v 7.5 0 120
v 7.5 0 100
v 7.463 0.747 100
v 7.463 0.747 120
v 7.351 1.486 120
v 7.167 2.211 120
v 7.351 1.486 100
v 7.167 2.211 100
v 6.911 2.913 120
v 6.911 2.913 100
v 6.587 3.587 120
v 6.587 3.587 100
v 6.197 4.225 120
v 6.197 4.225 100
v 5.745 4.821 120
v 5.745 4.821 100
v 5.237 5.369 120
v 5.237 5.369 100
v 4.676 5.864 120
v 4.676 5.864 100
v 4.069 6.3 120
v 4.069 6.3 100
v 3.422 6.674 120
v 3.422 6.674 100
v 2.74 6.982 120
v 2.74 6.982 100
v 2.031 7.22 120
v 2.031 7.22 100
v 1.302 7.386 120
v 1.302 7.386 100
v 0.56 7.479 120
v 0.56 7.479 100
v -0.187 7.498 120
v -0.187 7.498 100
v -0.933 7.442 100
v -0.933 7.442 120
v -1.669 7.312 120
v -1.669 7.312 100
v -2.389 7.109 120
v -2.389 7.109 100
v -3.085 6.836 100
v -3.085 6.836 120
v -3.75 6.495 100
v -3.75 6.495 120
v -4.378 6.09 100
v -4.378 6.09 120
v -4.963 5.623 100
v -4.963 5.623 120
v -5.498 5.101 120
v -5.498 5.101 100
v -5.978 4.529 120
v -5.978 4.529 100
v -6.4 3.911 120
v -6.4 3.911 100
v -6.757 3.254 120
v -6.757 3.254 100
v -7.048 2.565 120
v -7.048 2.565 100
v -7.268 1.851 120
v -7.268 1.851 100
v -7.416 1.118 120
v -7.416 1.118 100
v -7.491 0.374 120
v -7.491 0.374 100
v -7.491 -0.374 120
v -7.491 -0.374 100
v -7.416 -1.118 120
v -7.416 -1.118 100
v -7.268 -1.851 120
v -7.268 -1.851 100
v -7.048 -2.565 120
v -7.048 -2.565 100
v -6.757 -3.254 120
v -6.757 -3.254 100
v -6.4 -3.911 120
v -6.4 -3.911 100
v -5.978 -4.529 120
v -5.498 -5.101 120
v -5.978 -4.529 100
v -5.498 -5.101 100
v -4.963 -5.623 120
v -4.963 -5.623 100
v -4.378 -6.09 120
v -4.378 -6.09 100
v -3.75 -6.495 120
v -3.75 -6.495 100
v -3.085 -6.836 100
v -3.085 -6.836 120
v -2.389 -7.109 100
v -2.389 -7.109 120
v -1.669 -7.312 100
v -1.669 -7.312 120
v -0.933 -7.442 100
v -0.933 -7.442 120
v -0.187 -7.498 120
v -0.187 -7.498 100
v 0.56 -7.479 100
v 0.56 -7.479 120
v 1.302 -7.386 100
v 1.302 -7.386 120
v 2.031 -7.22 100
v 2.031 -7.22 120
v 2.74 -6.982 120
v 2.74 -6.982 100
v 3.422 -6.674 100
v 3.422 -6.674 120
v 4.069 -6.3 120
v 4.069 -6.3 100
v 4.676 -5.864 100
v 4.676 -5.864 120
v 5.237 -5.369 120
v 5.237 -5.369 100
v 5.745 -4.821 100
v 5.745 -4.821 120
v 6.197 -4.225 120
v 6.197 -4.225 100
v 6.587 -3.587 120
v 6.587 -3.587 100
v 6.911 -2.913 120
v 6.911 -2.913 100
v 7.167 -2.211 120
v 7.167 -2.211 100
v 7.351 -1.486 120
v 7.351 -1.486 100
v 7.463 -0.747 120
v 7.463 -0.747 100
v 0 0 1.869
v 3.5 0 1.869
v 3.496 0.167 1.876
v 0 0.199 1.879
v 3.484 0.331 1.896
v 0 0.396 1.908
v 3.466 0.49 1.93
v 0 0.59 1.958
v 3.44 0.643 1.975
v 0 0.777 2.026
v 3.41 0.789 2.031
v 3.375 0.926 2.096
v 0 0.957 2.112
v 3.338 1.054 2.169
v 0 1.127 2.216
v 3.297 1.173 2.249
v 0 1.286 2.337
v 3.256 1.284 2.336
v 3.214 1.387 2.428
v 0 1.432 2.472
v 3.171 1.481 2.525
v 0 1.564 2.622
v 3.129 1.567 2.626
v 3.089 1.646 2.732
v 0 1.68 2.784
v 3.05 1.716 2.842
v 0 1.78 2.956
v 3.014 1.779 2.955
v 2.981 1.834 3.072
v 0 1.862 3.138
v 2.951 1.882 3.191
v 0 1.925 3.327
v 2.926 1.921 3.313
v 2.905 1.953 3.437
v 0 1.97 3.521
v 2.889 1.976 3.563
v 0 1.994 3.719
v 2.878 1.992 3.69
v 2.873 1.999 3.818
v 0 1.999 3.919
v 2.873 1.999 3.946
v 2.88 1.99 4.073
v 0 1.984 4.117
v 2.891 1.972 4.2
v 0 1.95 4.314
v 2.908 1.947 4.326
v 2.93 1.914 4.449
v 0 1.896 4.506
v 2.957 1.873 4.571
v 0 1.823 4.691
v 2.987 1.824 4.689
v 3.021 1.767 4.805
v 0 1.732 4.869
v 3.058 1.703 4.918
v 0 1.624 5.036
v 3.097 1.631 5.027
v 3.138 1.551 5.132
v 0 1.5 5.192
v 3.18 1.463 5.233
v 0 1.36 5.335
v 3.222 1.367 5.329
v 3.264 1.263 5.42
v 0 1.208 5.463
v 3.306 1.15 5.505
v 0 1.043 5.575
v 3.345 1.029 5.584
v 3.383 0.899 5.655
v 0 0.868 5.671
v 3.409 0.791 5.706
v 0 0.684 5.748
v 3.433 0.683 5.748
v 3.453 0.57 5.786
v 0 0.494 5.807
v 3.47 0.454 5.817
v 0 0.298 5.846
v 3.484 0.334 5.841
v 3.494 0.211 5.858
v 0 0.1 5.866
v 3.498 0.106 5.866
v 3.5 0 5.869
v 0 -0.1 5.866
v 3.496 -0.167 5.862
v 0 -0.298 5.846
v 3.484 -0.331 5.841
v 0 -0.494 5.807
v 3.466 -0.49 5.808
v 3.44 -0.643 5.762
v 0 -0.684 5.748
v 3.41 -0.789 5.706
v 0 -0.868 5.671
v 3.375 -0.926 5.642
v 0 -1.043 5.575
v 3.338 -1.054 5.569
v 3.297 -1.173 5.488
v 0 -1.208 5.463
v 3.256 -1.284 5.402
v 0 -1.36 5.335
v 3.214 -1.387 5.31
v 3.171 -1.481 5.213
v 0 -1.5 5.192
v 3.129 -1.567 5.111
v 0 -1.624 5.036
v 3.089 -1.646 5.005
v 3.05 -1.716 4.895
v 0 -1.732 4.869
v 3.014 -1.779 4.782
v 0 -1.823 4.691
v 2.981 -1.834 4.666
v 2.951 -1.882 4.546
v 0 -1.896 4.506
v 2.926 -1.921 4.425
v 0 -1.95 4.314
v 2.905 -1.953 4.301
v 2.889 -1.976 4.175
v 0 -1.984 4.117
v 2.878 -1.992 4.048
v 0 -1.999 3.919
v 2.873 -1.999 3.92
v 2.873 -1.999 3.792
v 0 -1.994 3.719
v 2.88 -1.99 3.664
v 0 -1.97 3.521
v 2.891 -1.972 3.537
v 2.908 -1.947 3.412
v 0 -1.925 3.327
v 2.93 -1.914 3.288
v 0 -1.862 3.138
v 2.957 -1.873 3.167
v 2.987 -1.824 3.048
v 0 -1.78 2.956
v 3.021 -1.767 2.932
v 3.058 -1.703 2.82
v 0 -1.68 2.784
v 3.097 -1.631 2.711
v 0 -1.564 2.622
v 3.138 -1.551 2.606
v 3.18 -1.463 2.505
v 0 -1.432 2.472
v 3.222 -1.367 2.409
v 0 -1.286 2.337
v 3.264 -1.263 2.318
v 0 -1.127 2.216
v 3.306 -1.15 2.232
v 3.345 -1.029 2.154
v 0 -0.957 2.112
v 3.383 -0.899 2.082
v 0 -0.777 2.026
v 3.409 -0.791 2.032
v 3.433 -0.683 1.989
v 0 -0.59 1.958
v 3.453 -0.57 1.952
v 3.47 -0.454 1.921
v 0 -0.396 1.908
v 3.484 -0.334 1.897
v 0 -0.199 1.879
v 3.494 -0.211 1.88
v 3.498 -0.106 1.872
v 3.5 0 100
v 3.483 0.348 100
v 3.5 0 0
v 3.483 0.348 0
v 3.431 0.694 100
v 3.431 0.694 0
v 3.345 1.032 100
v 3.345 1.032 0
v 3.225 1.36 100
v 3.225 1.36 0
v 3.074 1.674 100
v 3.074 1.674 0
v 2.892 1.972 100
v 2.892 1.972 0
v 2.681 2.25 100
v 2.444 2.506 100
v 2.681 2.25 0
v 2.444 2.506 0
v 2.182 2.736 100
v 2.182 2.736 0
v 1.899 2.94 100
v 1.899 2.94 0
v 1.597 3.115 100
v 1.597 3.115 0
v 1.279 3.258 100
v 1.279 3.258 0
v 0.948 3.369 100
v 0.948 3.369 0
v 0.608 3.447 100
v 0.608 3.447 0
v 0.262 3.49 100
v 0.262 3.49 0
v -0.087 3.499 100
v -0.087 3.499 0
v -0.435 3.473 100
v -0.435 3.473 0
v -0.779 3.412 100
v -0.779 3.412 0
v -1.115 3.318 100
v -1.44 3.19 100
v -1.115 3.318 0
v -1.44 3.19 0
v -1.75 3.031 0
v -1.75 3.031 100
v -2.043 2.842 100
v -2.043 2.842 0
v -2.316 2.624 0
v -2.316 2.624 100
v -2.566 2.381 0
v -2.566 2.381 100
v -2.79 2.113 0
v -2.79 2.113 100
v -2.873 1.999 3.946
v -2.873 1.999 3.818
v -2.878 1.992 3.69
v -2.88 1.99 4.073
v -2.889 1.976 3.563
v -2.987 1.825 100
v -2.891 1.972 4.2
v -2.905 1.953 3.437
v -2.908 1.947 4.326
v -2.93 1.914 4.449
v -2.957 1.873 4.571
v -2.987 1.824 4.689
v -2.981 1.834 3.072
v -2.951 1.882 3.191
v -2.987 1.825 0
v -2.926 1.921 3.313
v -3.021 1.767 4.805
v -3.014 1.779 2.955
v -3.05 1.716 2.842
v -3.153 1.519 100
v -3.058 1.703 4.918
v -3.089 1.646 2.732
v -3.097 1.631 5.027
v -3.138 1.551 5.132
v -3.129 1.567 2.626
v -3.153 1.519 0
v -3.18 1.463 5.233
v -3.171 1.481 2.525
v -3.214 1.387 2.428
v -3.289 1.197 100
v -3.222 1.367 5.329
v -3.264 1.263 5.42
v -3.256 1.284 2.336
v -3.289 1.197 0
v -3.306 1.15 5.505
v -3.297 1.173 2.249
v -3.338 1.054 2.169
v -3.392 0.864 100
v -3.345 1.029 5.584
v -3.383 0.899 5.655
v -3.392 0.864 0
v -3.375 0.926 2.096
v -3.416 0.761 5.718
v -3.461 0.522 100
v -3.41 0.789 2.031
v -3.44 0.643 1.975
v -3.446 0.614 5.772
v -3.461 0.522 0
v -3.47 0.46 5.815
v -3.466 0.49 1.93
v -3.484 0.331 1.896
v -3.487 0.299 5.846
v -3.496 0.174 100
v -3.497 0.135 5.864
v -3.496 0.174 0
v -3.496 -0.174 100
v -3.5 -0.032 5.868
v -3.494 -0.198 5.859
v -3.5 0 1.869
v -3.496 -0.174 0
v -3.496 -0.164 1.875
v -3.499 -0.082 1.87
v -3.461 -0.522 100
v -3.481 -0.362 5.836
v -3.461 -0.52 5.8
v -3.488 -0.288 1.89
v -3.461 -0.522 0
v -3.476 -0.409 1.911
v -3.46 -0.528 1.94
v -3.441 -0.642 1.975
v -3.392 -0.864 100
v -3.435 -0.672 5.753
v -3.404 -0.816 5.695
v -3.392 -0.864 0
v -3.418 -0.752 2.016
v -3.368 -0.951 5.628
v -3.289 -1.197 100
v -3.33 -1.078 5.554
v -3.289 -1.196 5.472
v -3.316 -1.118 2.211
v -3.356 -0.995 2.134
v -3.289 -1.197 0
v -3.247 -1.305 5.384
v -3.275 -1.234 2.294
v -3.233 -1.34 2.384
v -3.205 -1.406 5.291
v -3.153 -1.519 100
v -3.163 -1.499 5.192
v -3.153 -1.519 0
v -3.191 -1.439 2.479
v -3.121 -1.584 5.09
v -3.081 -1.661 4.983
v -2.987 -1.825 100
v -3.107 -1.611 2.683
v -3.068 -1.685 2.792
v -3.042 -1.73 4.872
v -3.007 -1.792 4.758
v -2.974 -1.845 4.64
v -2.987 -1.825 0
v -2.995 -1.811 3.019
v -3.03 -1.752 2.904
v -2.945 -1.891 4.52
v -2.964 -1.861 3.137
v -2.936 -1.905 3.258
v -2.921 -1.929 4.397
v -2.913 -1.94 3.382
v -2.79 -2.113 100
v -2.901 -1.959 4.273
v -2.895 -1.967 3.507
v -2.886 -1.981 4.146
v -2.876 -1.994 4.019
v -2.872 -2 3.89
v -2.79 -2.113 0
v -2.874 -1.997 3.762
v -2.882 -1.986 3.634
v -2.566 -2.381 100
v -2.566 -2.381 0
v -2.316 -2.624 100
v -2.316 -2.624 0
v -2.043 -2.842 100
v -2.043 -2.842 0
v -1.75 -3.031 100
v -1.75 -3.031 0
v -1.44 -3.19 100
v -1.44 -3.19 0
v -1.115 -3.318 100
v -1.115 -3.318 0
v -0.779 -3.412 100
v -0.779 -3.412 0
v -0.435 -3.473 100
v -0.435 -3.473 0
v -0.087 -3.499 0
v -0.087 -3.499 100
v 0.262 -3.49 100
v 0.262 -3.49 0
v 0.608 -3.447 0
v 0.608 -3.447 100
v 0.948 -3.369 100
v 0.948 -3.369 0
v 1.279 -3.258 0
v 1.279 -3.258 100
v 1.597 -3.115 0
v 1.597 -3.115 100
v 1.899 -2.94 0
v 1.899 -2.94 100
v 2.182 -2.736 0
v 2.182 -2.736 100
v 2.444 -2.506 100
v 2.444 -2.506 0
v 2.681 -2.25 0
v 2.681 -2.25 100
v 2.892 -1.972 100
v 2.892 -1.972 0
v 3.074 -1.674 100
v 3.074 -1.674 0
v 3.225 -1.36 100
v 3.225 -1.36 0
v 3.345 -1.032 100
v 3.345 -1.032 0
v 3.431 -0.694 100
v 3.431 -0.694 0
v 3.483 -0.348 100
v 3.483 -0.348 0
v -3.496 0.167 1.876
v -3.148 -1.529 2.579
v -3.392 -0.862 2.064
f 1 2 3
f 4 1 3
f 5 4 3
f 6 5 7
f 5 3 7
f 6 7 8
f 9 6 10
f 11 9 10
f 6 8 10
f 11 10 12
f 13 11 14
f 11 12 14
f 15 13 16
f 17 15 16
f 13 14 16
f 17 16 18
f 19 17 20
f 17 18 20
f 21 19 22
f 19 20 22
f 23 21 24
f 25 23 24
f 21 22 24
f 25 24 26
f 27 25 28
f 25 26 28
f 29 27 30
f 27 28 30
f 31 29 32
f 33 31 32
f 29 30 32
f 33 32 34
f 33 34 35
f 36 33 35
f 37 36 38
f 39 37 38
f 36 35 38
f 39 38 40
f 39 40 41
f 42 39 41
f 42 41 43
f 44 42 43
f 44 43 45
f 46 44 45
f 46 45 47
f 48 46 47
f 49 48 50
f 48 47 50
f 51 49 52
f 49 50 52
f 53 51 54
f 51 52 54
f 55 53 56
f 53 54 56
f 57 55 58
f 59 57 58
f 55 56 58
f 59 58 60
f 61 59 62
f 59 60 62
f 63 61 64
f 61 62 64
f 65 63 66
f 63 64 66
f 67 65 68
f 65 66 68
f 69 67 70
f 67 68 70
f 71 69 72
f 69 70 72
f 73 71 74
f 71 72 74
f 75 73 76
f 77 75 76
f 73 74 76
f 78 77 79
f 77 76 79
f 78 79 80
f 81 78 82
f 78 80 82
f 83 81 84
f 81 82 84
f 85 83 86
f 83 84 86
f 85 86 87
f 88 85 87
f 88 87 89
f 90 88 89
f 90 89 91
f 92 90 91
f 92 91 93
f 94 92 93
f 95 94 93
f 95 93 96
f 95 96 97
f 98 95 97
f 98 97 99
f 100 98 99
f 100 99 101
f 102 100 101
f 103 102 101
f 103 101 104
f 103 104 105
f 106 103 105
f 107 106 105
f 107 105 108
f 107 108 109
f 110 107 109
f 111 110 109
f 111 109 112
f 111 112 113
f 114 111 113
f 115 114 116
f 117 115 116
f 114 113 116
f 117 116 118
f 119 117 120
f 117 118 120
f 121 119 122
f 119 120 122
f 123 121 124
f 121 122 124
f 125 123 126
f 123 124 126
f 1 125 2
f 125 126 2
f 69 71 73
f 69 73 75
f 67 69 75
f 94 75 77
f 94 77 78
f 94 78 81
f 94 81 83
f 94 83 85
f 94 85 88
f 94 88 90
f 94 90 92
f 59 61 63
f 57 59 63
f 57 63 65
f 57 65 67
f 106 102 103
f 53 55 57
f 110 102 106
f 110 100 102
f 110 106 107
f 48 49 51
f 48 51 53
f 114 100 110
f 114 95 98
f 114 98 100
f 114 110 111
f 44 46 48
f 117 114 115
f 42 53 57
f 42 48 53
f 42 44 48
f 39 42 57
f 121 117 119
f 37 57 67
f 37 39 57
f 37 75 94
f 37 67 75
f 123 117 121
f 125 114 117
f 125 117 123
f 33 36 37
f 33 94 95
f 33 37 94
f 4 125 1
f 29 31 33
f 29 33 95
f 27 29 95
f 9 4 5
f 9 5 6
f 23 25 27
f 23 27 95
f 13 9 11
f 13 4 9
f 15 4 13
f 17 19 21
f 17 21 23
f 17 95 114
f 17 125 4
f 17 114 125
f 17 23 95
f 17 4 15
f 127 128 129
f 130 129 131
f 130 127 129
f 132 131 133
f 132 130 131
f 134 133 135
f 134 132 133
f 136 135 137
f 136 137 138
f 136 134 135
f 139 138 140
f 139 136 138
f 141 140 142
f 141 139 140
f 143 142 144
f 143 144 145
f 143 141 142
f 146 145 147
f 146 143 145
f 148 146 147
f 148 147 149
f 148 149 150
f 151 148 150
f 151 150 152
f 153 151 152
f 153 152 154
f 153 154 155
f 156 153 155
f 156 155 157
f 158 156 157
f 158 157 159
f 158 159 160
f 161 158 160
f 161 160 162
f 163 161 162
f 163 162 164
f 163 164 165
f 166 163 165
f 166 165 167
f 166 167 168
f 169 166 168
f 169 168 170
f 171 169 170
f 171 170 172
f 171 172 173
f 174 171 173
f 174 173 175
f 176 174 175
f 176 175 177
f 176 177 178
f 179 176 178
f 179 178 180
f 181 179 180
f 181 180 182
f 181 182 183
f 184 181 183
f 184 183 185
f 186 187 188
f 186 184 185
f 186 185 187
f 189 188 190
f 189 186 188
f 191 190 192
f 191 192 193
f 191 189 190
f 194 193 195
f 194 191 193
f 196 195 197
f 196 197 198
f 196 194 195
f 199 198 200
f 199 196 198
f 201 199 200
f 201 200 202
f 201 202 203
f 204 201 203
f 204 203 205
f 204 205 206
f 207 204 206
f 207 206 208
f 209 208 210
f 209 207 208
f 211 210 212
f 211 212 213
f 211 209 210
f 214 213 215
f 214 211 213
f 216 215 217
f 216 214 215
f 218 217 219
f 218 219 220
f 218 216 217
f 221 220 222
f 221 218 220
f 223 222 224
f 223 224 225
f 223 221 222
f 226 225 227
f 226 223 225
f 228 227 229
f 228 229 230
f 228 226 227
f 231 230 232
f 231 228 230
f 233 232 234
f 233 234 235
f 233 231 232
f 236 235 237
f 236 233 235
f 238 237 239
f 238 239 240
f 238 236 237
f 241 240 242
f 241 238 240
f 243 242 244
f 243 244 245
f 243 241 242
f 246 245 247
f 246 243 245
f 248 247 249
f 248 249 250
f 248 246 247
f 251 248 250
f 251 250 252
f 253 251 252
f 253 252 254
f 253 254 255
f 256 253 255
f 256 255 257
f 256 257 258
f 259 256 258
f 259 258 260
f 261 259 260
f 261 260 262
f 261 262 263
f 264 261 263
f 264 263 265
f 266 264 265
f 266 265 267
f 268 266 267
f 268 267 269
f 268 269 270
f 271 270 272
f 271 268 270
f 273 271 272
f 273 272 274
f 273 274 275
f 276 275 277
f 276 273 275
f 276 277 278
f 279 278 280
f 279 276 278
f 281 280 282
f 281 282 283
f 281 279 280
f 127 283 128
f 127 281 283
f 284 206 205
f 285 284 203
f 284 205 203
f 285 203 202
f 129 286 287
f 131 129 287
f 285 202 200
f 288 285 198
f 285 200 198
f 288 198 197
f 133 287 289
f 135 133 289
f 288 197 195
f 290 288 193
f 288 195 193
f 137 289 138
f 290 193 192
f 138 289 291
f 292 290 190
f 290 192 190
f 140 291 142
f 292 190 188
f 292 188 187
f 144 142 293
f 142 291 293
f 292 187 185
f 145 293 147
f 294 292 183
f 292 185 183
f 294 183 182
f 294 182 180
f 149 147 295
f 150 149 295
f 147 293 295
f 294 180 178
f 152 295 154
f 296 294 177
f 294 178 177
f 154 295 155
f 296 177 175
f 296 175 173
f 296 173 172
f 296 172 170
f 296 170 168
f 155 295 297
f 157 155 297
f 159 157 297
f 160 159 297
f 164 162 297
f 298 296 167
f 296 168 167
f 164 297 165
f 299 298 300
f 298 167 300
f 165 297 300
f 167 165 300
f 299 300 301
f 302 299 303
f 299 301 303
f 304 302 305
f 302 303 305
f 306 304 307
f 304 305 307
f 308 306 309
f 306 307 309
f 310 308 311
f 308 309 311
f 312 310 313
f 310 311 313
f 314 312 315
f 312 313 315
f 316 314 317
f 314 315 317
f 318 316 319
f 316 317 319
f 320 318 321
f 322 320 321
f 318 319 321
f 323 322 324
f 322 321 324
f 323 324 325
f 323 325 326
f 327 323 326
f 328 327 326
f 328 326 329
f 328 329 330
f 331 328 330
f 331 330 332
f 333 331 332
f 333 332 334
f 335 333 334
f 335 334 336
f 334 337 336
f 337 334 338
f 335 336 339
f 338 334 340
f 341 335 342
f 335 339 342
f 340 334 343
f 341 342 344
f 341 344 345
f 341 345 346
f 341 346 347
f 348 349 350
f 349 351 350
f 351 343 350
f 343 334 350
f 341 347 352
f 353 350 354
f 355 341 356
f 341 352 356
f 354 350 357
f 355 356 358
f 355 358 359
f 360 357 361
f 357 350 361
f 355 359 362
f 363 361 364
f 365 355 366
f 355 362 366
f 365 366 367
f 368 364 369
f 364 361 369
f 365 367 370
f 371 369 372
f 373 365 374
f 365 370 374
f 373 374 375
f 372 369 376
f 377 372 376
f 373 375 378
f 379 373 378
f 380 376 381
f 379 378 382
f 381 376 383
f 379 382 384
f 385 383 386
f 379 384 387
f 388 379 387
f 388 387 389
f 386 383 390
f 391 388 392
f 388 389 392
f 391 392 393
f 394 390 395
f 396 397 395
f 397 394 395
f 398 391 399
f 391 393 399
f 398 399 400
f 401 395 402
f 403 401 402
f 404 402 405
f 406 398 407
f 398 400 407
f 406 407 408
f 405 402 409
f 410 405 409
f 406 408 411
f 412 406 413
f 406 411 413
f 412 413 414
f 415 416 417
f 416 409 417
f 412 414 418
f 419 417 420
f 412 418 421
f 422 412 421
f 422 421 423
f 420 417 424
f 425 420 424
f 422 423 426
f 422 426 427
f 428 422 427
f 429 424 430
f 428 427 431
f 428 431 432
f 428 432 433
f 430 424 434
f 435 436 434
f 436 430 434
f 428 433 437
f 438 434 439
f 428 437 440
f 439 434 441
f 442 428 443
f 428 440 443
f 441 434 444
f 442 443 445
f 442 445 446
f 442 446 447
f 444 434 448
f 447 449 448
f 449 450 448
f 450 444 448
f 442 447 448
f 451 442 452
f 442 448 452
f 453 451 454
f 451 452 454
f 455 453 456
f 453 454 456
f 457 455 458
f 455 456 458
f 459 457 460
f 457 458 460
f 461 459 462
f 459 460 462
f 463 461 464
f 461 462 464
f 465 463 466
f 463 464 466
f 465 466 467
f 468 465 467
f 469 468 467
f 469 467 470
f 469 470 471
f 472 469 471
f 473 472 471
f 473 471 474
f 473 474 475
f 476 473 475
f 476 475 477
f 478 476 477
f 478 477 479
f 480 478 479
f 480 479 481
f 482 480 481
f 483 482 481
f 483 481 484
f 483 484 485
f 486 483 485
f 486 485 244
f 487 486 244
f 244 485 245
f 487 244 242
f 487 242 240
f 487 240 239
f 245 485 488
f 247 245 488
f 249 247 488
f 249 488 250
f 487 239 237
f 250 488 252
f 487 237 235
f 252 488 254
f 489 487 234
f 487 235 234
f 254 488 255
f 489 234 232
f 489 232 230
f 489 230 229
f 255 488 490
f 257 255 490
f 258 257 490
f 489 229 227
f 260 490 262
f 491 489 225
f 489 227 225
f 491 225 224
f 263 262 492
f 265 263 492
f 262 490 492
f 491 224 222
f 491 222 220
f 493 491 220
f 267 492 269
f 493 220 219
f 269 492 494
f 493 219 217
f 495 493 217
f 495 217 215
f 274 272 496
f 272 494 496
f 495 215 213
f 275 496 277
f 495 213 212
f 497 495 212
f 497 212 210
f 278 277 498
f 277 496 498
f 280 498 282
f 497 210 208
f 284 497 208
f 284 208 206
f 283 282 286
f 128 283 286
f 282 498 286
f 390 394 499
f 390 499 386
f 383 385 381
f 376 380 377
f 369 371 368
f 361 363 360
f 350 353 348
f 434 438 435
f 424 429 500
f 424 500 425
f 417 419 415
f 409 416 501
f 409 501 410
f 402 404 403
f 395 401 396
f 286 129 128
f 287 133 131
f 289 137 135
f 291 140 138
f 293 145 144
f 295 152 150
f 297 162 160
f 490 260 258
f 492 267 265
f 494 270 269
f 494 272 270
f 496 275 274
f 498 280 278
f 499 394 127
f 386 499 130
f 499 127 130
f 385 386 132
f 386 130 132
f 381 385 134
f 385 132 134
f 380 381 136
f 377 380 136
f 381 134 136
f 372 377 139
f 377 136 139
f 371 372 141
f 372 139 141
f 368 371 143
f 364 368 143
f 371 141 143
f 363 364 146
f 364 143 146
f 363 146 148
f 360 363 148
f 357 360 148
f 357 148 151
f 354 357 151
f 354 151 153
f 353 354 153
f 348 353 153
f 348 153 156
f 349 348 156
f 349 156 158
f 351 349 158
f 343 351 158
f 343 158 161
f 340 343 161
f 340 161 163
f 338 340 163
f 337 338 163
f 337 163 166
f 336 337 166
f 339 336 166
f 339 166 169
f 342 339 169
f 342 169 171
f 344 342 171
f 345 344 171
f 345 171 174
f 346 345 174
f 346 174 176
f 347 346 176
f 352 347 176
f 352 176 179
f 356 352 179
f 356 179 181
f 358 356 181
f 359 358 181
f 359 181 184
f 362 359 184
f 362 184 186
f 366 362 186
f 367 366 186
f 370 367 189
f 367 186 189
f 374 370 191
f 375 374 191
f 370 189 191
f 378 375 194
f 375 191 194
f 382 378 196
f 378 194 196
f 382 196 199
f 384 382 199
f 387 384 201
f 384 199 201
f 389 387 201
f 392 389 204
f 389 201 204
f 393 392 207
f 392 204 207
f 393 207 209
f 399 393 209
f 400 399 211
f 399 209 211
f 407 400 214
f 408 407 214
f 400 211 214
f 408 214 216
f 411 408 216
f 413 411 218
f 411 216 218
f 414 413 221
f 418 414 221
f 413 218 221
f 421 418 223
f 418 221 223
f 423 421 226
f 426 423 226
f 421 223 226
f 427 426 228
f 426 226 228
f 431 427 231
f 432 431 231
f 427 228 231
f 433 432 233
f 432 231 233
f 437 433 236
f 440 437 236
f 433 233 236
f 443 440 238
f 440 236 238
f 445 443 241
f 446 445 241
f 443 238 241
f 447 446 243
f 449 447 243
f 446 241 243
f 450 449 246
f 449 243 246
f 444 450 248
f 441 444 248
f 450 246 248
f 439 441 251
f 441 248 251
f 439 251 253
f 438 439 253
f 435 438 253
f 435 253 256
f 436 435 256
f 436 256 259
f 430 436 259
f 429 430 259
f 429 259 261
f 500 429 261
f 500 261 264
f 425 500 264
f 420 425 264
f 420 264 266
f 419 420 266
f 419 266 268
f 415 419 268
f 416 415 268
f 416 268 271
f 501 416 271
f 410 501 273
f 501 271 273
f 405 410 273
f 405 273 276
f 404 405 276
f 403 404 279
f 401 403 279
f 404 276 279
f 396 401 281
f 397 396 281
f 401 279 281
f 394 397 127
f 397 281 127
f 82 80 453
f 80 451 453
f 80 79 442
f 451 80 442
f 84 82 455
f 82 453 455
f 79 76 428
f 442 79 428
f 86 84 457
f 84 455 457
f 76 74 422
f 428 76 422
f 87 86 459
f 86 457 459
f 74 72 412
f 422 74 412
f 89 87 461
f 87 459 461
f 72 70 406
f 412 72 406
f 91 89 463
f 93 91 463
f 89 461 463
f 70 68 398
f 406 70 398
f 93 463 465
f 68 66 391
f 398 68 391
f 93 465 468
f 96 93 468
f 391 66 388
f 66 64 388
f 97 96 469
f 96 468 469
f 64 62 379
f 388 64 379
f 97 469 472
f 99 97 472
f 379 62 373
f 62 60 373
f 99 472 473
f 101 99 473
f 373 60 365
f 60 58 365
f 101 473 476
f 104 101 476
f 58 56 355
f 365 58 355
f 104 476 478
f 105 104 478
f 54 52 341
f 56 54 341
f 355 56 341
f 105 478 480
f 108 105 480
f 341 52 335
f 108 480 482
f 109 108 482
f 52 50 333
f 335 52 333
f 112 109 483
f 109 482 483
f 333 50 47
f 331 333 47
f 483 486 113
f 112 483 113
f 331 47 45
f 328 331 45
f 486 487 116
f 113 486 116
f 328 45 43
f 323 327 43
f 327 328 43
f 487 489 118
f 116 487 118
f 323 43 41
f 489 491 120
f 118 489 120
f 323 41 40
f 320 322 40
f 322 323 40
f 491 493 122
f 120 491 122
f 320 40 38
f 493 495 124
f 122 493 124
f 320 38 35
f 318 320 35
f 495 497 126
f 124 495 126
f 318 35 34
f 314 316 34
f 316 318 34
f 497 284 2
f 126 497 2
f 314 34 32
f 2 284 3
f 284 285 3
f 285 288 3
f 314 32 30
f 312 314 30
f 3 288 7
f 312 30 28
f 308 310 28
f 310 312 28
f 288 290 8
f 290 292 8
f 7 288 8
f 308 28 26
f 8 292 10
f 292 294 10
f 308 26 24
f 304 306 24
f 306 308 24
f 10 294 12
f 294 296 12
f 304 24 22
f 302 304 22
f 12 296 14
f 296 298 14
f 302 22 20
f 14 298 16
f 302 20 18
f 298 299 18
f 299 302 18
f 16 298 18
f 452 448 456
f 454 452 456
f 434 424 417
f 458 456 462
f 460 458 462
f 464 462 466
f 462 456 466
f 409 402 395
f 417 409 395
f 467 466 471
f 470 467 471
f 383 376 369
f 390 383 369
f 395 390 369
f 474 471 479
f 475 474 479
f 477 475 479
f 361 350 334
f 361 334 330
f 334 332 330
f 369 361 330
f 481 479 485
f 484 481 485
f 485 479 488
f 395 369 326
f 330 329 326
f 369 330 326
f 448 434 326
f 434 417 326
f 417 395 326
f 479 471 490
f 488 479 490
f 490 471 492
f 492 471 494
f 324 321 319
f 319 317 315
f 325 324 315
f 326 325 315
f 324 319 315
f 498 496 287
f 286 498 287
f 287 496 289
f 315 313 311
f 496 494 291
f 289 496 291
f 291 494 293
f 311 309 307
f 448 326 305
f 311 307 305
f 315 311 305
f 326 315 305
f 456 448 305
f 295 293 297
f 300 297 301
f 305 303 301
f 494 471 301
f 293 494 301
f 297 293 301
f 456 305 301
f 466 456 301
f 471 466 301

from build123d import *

# Parameters (mm, degrees)
SKETCH1_R               = 3.5
BOSS_EXTRUDE1_DEPTH     = 100
SKETCH2_R               = 7.5
BOSS_EXTRUDE2_DEPTH     = 20
SKETCH3_R               = 2
CUT_EXTRUDE1_DEPTH      = 8.5
CUT_EXTRUDE1_DEPTH_BACK = 8.5


with BuildPart() as part:
    # Sketch1 → Boss-Extrude1 (new body)
    with BuildSketch(Plane.XY):
        Circle(SKETCH1_R)
    extrude(amount=BOSS_EXTRUDE1_DEPTH)

    # Sketch2 → Boss-Extrude2 (add)
    with BuildSketch(Plane.XY.offset(100)):
        Circle(SKETCH2_R)
    extrude(amount=BOSS_EXTRUDE2_DEPTH)

    # Sketch3 → Cut-Extrude1 (cut, two sides)
    with BuildSketch(Plane(origin=(0, 0, 0), x_dir=(0, 0, -1), z_dir=(1, 0, 0))) as cut_extrude1_sk:
        with Locations((-3.868694711, 0)):
            Circle(SKETCH3_R)
    extrude(amount=CUT_EXTRUDE1_DEPTH, mode=Mode.SUBTRACT)
    extrude(cut_extrude1_sk.sketch, amount=-CUT_EXTRUDE1_DEPTH_BACK, mode=Mode.SUBTRACT)


solid = part.part
